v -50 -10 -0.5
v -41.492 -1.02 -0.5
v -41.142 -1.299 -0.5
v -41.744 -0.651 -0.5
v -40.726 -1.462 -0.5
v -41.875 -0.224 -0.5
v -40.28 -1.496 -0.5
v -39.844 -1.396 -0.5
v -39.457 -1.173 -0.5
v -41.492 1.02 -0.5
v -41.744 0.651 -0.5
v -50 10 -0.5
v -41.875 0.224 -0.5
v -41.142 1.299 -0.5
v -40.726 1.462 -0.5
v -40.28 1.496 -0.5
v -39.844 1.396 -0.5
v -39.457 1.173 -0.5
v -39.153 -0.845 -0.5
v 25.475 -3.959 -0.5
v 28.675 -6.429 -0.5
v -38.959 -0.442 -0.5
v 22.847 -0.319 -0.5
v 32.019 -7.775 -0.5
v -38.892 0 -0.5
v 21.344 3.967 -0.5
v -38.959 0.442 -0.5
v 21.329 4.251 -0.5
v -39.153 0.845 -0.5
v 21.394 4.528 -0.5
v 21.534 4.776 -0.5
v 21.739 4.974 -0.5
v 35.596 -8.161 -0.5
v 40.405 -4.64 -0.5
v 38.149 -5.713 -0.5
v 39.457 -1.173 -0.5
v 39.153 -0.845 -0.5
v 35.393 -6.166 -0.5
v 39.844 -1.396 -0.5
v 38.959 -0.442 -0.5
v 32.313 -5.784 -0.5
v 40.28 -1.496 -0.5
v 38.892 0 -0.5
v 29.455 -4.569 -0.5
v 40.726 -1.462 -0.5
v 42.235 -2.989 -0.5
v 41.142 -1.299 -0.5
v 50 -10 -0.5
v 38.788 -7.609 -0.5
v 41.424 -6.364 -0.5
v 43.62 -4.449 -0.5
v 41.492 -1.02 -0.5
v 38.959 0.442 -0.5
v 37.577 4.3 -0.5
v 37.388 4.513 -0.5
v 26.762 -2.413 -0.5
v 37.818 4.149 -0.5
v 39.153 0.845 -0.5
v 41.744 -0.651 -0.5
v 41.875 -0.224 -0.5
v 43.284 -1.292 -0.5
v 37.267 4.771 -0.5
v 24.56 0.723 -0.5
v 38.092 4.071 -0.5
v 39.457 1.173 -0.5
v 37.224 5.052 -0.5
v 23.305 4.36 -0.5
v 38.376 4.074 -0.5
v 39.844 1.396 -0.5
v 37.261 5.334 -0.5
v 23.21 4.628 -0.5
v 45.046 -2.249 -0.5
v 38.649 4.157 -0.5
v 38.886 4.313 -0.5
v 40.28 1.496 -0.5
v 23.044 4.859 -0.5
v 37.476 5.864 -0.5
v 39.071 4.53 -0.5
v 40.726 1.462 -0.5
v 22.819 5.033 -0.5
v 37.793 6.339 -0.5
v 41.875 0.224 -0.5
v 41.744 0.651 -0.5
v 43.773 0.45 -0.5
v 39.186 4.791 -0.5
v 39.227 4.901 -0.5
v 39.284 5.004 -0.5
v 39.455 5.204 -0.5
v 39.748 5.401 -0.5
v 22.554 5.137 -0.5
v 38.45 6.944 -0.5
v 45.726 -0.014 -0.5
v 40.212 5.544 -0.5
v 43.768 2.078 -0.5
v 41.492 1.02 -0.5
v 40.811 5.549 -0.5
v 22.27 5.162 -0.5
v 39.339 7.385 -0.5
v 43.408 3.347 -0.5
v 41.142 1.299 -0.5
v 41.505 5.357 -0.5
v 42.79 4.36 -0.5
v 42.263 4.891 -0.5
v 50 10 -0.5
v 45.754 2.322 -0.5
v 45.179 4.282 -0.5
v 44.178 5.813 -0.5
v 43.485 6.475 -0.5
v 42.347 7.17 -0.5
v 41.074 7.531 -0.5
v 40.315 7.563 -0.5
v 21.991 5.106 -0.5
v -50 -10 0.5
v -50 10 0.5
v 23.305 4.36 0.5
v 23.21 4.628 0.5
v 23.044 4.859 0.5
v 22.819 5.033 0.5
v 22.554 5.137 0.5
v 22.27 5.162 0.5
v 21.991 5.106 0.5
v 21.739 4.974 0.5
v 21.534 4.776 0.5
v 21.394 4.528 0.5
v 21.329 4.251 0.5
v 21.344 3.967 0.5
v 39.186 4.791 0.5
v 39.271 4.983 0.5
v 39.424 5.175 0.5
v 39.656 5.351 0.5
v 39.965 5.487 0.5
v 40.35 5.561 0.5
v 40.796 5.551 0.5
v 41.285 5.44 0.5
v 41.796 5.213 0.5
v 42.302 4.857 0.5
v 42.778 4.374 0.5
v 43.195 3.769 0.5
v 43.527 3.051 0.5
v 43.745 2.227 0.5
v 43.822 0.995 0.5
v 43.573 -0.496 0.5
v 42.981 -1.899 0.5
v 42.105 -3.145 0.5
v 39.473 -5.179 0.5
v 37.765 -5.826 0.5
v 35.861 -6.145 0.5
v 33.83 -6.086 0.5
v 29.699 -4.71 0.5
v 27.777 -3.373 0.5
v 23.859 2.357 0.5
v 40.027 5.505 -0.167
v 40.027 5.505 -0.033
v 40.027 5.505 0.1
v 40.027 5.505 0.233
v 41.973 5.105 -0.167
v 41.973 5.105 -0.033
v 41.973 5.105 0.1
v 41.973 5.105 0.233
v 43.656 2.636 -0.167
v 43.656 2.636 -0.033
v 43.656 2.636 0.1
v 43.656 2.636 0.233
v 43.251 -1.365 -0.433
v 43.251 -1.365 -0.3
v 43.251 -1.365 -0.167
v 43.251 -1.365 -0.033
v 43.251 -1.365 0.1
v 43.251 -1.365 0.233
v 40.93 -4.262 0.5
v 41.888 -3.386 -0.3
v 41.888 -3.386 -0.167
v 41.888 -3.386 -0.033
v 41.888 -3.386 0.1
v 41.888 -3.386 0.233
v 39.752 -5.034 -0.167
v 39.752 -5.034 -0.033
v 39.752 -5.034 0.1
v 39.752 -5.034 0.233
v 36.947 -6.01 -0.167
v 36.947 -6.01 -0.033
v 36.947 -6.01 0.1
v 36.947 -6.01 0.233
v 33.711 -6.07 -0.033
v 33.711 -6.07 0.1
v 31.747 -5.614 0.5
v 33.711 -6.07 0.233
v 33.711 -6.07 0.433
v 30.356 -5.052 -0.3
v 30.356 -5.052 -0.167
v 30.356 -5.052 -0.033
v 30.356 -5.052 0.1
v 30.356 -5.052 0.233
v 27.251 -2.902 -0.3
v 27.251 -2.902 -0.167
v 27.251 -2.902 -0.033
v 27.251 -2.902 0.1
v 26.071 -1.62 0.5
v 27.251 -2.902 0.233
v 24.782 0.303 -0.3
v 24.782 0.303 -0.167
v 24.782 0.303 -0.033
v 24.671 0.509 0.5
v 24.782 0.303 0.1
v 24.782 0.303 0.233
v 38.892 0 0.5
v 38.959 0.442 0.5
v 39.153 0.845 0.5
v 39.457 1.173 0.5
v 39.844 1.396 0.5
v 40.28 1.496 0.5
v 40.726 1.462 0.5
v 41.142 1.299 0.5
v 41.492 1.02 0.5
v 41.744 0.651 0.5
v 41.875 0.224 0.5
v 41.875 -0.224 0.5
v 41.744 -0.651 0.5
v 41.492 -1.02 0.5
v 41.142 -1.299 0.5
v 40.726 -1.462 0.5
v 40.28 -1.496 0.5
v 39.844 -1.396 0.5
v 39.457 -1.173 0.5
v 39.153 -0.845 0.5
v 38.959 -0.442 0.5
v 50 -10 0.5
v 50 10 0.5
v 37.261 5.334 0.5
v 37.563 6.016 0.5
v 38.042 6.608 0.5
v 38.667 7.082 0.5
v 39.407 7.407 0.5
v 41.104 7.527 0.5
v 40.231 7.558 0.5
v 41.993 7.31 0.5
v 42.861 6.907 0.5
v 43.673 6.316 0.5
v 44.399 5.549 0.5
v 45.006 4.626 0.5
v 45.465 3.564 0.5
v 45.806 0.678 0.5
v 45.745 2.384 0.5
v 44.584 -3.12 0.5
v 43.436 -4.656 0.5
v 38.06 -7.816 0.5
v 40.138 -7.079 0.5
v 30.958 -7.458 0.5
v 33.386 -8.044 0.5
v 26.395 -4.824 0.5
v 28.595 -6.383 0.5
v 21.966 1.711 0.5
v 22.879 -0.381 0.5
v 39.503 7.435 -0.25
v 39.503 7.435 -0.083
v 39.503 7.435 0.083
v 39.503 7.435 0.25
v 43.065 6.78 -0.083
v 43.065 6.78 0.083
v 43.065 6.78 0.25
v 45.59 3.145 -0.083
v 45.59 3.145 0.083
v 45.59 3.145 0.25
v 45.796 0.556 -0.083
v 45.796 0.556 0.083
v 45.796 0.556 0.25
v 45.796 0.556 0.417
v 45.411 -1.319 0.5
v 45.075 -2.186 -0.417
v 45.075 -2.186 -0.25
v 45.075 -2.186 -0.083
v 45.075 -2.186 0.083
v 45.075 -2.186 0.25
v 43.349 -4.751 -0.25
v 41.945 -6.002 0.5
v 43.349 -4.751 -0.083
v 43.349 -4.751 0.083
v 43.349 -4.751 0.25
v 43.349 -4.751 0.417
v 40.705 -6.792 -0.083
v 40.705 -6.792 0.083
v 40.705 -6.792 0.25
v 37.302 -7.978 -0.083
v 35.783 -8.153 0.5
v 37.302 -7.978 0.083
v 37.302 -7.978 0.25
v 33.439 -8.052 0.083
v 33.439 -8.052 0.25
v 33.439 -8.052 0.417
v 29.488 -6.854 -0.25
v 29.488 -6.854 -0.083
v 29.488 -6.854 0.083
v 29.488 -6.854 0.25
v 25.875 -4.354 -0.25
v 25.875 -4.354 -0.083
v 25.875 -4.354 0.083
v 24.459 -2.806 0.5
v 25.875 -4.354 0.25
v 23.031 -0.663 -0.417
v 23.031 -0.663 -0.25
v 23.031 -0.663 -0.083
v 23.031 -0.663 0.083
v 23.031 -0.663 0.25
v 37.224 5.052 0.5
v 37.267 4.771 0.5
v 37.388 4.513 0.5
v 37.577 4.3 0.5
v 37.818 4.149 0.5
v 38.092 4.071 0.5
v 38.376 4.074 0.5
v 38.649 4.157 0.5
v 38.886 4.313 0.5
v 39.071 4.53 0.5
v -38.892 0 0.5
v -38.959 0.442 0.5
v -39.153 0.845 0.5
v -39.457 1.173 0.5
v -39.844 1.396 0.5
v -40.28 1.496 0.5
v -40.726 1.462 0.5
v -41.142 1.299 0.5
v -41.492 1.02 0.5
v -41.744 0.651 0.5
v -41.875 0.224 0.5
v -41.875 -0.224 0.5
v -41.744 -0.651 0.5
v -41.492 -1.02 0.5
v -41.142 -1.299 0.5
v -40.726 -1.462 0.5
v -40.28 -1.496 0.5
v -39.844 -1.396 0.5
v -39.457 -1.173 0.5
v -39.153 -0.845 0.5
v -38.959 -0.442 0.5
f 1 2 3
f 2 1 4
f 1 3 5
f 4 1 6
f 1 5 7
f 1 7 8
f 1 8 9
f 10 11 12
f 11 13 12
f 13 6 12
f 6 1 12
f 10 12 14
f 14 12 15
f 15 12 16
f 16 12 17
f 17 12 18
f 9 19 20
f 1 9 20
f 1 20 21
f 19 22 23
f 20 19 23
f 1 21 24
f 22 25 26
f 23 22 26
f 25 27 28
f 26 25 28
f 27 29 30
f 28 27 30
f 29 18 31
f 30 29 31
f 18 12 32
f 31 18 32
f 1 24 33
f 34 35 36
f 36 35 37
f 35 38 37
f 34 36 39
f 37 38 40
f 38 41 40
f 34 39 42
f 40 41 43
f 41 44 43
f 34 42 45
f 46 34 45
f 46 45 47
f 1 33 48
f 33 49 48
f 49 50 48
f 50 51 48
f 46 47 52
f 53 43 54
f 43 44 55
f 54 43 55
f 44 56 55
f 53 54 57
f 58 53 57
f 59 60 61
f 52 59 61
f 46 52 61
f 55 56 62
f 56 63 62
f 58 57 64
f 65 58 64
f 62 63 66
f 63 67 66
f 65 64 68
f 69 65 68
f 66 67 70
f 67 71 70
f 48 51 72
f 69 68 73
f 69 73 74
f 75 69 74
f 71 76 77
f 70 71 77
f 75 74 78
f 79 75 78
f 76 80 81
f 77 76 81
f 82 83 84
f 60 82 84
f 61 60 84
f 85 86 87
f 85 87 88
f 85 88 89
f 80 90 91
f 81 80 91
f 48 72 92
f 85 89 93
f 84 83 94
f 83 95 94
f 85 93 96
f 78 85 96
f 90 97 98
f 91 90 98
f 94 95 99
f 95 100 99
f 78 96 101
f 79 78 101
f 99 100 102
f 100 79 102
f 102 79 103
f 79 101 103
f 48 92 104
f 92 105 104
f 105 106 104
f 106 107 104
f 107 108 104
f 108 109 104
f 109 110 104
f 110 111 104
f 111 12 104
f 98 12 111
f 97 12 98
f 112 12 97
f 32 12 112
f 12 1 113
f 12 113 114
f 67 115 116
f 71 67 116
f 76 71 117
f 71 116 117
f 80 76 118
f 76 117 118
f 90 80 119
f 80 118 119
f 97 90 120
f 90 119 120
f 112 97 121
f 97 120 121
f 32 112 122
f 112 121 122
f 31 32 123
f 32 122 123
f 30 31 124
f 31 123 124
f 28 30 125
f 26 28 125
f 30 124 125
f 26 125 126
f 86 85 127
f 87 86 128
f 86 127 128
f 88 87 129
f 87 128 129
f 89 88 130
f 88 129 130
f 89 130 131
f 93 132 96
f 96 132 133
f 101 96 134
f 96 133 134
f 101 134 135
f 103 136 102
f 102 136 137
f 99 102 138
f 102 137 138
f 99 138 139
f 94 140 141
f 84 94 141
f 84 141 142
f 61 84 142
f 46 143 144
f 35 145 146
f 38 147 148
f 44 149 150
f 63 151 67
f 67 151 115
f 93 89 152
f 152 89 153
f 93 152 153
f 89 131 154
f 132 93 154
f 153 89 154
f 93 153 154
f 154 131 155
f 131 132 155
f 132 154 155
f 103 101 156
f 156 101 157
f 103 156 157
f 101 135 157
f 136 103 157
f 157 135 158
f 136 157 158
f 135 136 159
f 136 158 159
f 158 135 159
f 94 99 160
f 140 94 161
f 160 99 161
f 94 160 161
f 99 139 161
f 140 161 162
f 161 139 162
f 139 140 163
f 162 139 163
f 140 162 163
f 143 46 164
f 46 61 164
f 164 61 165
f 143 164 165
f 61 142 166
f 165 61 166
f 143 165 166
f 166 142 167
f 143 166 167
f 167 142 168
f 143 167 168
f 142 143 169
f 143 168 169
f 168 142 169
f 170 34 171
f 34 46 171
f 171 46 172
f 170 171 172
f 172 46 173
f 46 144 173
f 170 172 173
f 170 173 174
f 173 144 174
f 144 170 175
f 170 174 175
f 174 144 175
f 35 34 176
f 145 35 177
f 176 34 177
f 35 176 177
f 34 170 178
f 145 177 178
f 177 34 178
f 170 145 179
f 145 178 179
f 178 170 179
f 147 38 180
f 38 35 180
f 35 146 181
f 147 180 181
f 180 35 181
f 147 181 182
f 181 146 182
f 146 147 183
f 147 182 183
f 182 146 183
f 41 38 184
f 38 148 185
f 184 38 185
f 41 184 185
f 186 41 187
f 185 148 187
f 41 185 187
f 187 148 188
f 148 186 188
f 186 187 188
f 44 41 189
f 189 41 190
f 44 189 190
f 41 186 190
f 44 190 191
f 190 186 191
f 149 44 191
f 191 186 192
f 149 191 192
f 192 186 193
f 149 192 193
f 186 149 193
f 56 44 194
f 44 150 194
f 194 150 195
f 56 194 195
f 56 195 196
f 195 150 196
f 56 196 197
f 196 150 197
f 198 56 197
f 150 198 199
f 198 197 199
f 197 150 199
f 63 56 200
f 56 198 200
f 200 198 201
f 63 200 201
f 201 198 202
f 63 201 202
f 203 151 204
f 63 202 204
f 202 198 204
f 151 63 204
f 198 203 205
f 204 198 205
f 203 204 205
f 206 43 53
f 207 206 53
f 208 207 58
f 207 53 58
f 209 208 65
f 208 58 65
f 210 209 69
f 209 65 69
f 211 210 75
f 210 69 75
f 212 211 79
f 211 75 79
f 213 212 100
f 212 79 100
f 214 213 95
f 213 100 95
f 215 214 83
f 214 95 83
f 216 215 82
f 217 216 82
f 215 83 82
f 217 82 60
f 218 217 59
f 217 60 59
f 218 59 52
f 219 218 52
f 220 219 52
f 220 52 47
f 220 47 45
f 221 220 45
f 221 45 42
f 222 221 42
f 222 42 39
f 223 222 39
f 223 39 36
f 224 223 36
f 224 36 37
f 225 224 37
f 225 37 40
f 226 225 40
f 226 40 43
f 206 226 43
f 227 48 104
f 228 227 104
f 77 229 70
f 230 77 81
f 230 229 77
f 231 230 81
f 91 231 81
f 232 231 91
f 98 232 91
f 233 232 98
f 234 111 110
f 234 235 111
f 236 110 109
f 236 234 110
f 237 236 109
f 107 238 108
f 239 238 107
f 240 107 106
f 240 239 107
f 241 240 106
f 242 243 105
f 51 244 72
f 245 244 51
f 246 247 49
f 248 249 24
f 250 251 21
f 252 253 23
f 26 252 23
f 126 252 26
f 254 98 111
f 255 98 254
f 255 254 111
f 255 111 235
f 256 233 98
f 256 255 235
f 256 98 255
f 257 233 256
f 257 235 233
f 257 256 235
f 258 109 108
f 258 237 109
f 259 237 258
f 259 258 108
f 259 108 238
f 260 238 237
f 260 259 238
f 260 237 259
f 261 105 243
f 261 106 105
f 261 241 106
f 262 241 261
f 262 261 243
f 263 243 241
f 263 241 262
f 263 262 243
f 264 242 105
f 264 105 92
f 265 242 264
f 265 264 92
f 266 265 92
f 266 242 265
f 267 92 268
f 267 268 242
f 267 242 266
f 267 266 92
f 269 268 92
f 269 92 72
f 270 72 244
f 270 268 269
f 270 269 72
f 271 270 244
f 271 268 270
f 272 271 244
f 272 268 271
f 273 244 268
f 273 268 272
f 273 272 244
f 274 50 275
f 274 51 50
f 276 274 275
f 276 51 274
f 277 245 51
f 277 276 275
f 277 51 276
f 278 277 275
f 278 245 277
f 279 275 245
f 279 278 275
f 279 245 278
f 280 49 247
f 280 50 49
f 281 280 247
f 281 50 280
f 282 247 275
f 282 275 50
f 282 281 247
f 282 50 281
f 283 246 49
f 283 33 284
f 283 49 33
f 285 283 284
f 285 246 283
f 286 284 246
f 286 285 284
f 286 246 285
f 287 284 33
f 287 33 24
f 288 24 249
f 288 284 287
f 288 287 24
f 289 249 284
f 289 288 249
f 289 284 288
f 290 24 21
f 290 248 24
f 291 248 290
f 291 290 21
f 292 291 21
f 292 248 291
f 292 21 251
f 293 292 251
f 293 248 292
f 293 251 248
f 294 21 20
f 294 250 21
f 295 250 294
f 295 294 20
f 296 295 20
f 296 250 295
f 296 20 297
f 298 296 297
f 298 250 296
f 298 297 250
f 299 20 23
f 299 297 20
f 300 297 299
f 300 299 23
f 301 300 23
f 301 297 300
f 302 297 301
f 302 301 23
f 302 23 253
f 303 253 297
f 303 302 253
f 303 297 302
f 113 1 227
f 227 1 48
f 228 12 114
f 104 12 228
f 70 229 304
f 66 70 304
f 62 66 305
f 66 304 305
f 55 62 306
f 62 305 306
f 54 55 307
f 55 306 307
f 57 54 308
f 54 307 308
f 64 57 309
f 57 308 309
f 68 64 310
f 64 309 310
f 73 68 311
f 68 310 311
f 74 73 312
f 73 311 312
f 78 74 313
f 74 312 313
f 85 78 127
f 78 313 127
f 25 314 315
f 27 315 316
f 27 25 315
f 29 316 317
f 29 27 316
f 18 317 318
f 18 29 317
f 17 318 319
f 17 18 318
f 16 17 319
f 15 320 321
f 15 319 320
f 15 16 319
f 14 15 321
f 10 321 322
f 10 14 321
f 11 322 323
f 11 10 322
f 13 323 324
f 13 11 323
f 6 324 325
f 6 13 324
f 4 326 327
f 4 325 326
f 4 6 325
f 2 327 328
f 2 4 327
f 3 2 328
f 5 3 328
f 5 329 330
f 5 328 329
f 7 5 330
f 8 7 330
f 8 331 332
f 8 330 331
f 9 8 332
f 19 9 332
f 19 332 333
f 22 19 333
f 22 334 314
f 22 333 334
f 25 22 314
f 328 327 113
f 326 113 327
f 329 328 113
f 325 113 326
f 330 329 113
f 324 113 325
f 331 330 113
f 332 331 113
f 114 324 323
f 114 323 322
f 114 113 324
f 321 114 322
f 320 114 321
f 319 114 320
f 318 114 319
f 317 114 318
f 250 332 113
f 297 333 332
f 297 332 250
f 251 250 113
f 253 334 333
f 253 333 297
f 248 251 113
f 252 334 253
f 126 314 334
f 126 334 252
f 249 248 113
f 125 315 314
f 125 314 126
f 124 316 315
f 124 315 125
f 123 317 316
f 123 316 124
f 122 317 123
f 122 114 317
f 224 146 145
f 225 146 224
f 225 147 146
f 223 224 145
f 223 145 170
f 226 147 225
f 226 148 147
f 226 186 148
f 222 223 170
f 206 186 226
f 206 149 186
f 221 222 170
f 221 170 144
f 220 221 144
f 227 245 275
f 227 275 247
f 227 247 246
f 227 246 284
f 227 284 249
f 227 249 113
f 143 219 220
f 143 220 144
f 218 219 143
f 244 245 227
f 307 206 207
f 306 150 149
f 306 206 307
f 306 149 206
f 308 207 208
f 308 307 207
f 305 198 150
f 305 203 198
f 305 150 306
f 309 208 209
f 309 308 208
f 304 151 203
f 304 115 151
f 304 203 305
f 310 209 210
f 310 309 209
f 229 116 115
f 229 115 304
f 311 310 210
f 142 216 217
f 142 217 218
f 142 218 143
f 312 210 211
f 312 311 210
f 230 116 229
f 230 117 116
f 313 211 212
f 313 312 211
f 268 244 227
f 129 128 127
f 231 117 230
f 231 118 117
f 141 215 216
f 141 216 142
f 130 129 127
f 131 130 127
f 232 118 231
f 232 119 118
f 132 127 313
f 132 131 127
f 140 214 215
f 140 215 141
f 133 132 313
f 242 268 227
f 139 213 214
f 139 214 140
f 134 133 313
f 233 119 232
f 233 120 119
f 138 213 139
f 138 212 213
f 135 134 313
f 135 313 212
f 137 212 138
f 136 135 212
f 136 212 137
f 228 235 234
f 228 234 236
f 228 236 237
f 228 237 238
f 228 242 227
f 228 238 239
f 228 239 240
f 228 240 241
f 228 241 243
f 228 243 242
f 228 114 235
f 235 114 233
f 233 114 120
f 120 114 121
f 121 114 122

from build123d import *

# Parameters (mm, degrees)
EXTRUDE_1_DEPTH      = 0.5
EXTRUDE_1_DEPTH_BACK = 0.5
SKETCH_1_W           = 100
SKETCH_1_H           = 20
CUT_EXTRUDE_1_DEPTH  = 52
SKETCH_8_R           = 1.5
CUT_EXTRUDE_2_DEPTH  = 52.00000012
SKETCH_9_R           = 1.05
EXTRUDE_2_DEPTH      = 2
OTHER_START          = -2.5
OTHER_2_OUTLINE_R    = 1.05
OTHER_2_DEPTH        = 2


# Read off the part's stored shape, not the designer's step: Пересечение2
with BuildPart() as part:
    # Эскиз1 → Бобышка-Вытянуть1 (new, two sides: drawn at the far end of the back side and taken through both)
    with BuildSketch(Plane.XY.offset(-EXTRUDE_1_DEPTH_BACK)):
        Rectangle(SKETCH_1_W, SKETCH_1_H)
    extrude(amount=EXTRUDE_1_DEPTH + EXTRUDE_1_DEPTH_BACK)

    # Эскиз7 → Вырез-Вытянуть1 (cut, through all)
    with BuildSketch(Plane.XY.offset(0.5)):
        with BuildLine():
            ThreePointArc((37.261495637, 5.33423095), (37.952030231, 4.100066466), (39.186194715, 4.79060106))
            add(Edge.make_bspline(
                [(39.186194715, 4.79060106), (39.206075717, 4.860988923), (39.262496645, 4.988405972), (39.480772307, 5.263607744), (39.972116976, 5.552949613), (40.89012751, 5.611168859), (42.346211172, 5.064723366), (44.026902125, 2.933159087), (43.815557835, -1.408653234), (40.817030581, -4.80884968), (37.021062322, -6.164885186), (33.732157303, -6.253240822), (30.314099065, -5.243442536), (27.144697082, -3.082909818), (25.035720973, -0.378766084), (23.85308145, 2.208270108), (23.449186454, 3.64108751), (23.305322842, 4.359662985)],
                knots=[0, 0, 0, 0, 0.03125, 0.0625, 0.125, 0.1875, 0.25, 0.375, 0.5, 0.625, 0.6875, 0.75, 0.8125, 0.875, 0.9375, 0.96875, 1, 1, 1, 1], degree=3))
            ThreePointArc((23.305322842, 4.359662985), (22.128470162, 5.143893671), (21.344239476, 3.96704099))
            add(Edge.make_bspline(
                [(37.261495637, 5.33423095), (37.539855307, 6.319751815), (39.275153501, 7.946538331), (43.246471825, 7.317604488), (46.129826318, 3.464099405), (45.771597181, -2.30217859), (41.988507816, -6.528062966), (37.380831362, -8.166298308), (33.454677533, -8.267248255), (29.431863805, -7.074452826), (25.746418814, -4.55740521), (23.320064013, -1.441995451), (21.967408891, 1.518598896), (21.5081203, 3.148482776), (21.344239476, 3.96704099)],
                knots=[0, 0, 0, 0, 0.125, 0.25, 0.375, 0.5, 0.625, 0.6875, 0.75, 0.8125, 0.875, 0.9375, 0.96875, 1, 1, 1, 1], degree=3))
        make_face()
    extrude(amount=-CUT_EXTRUDE_1_DEPTH, mode=Mode.SUBTRACT)

    # Эскиз8 → Вырез-Вытянуть2 (cut, through all)
    with BuildSketch(Plane(origin=(0, 0, -0.5), x_dir=(-1, 0, 0), z_dir=(0, 0, -1))):
        with Locations((-40.392058098, 0)):
            Circle(SKETCH_8_R)
    cut_extrude_2 = extrude(amount=-CUT_EXTRUDE_2_DEPTH, mode=Mode.SUBTRACT)

    # Зеркальное отражение1: Вырез-Вытянуть2 across plane
    add(cut_extrude_2.mirror(Plane(origin=(0, 0, 0), x_dir=(0, 0, 1), z_dir=(1, 0, 0))), mode=Mode.SUBTRACT)


with BuildPart() as body_2:
    # Эскиз9 → Бобышка-Вытянуть2 (new body)
    with BuildSketch(Plane(origin=(0, 0, -0.5), x_dir=(-1, 0, 0), z_dir=(0, 0, -1))):
        with BuildLine():
            Line((-38.223845176, 7.062416005), (-136.223845176, 7.062416005))
            Line((-136.223845176, 7.062416005), (-136.223845176, 3.062416005))
            Line((-136.223845176, 3.062416005), (-38.223845176, 3.062416005))
            ThreePointArc((-38.223845176, 3.062416005), (-36.223845176, 5.062416005), (-38.223845176, 7.062416005))
        make_face()
        with Locations((-38.223845176, 5.062416005)):
            Circle(SKETCH_9_R, mode=Mode.SUBTRACT)
    extrude(amount=EXTRUDE_2_DEPTH)

    # Пересечение2 outline → Пересечение2 (cut)
    with BuildSketch(Plane.XY.offset(OTHER_START)):
        with BuildLine():
            Line((136.223845176, 7.062416005), (38.223845176, 7.062416005))
            ThreePointArc((38.223845176, 7.062416005), (36.223845176, 5.062416005), (38.223845176, 3.062416005))
            Line((38.223845176, 3.062416005), (136.223845176, 3.062416005))
            Line((136.223845176, 3.062416005), (136.223845176, 7.062416005))
        make_face()
        with Locations((38.223845176, 5.062416005)):
            Circle(OTHER_2_OUTLINE_R, mode=Mode.SUBTRACT)
    extrude(amount=OTHER_2_DEPTH, mode=Mode.SUBTRACT)


solid = part.part
